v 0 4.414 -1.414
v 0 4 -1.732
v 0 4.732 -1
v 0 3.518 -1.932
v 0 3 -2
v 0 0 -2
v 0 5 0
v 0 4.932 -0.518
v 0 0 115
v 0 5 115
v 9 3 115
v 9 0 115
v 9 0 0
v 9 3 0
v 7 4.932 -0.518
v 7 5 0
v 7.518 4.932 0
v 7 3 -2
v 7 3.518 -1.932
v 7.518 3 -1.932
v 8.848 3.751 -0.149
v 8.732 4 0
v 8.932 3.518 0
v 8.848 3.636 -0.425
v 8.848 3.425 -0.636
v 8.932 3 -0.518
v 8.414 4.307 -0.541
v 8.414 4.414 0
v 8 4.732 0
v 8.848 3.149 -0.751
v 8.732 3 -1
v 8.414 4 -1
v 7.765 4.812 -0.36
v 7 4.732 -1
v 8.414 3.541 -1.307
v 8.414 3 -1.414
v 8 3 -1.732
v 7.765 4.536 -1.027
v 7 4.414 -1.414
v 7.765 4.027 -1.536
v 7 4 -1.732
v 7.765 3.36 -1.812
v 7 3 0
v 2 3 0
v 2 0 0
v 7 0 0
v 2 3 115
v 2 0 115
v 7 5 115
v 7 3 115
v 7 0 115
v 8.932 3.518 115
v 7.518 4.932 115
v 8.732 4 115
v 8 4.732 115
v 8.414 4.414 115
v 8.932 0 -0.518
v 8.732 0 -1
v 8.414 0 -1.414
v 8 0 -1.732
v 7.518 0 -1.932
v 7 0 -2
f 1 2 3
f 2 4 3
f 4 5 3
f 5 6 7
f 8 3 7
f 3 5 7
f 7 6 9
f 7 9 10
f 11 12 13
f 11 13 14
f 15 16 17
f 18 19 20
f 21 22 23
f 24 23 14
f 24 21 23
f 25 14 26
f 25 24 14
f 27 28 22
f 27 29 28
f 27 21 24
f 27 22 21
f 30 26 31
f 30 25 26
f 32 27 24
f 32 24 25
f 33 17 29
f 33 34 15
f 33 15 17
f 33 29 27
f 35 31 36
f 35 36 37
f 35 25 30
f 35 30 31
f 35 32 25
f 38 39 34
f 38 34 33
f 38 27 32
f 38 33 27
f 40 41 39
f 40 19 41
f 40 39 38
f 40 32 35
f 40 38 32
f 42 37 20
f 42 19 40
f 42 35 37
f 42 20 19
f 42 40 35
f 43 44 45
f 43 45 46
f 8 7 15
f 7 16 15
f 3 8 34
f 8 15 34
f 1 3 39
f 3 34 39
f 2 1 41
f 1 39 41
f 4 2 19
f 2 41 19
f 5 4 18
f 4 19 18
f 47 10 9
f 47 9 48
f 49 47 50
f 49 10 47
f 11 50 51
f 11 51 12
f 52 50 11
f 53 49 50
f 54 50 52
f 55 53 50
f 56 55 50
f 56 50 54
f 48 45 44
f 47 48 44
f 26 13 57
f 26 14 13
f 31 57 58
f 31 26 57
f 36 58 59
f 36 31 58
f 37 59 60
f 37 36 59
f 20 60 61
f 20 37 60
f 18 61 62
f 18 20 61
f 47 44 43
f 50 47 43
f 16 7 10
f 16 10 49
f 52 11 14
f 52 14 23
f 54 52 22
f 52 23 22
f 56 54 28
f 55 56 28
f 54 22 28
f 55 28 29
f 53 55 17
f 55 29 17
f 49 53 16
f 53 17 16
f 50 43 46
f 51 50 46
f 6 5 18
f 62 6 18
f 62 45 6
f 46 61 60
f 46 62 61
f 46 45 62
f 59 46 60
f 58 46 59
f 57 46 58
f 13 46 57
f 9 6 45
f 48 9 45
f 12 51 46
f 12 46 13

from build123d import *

# Parameters (mm, degrees)
F1_DEPTH = 115
F2_W     = 9
F2_H     = 5
F3_DEPTH = 2
F4_R     = 2


with BuildPart() as f1:
    # F0 (on Top) → F1 (new body)
    with BuildSketch(Plane.XY):
        Polygon((0, 5), (0, 0), (2, 0), (2, 3), (7, 3), (7, 0), (9, 0), (9, 5), align=None)
    extrude(amount=F1_DEPTH)

    # F2 (on Top) → F3 (join)
    with BuildSketch(Plane.XY):
        with Locations((4.5, 2.5)):
            Rectangle(F2_W, F2_H)
    extrude(amount=-F3_DEPTH)

    # F4
    f4_edges = [f1.edges().sort_by_distance(p)[0] for p in [
        (4.5, 5, -2),
        (9, 5, 56.5),
        (9, 2.5, -2),
    ]]
    fillet(f4_edges, radius=F4_R)


solid = f1.part
